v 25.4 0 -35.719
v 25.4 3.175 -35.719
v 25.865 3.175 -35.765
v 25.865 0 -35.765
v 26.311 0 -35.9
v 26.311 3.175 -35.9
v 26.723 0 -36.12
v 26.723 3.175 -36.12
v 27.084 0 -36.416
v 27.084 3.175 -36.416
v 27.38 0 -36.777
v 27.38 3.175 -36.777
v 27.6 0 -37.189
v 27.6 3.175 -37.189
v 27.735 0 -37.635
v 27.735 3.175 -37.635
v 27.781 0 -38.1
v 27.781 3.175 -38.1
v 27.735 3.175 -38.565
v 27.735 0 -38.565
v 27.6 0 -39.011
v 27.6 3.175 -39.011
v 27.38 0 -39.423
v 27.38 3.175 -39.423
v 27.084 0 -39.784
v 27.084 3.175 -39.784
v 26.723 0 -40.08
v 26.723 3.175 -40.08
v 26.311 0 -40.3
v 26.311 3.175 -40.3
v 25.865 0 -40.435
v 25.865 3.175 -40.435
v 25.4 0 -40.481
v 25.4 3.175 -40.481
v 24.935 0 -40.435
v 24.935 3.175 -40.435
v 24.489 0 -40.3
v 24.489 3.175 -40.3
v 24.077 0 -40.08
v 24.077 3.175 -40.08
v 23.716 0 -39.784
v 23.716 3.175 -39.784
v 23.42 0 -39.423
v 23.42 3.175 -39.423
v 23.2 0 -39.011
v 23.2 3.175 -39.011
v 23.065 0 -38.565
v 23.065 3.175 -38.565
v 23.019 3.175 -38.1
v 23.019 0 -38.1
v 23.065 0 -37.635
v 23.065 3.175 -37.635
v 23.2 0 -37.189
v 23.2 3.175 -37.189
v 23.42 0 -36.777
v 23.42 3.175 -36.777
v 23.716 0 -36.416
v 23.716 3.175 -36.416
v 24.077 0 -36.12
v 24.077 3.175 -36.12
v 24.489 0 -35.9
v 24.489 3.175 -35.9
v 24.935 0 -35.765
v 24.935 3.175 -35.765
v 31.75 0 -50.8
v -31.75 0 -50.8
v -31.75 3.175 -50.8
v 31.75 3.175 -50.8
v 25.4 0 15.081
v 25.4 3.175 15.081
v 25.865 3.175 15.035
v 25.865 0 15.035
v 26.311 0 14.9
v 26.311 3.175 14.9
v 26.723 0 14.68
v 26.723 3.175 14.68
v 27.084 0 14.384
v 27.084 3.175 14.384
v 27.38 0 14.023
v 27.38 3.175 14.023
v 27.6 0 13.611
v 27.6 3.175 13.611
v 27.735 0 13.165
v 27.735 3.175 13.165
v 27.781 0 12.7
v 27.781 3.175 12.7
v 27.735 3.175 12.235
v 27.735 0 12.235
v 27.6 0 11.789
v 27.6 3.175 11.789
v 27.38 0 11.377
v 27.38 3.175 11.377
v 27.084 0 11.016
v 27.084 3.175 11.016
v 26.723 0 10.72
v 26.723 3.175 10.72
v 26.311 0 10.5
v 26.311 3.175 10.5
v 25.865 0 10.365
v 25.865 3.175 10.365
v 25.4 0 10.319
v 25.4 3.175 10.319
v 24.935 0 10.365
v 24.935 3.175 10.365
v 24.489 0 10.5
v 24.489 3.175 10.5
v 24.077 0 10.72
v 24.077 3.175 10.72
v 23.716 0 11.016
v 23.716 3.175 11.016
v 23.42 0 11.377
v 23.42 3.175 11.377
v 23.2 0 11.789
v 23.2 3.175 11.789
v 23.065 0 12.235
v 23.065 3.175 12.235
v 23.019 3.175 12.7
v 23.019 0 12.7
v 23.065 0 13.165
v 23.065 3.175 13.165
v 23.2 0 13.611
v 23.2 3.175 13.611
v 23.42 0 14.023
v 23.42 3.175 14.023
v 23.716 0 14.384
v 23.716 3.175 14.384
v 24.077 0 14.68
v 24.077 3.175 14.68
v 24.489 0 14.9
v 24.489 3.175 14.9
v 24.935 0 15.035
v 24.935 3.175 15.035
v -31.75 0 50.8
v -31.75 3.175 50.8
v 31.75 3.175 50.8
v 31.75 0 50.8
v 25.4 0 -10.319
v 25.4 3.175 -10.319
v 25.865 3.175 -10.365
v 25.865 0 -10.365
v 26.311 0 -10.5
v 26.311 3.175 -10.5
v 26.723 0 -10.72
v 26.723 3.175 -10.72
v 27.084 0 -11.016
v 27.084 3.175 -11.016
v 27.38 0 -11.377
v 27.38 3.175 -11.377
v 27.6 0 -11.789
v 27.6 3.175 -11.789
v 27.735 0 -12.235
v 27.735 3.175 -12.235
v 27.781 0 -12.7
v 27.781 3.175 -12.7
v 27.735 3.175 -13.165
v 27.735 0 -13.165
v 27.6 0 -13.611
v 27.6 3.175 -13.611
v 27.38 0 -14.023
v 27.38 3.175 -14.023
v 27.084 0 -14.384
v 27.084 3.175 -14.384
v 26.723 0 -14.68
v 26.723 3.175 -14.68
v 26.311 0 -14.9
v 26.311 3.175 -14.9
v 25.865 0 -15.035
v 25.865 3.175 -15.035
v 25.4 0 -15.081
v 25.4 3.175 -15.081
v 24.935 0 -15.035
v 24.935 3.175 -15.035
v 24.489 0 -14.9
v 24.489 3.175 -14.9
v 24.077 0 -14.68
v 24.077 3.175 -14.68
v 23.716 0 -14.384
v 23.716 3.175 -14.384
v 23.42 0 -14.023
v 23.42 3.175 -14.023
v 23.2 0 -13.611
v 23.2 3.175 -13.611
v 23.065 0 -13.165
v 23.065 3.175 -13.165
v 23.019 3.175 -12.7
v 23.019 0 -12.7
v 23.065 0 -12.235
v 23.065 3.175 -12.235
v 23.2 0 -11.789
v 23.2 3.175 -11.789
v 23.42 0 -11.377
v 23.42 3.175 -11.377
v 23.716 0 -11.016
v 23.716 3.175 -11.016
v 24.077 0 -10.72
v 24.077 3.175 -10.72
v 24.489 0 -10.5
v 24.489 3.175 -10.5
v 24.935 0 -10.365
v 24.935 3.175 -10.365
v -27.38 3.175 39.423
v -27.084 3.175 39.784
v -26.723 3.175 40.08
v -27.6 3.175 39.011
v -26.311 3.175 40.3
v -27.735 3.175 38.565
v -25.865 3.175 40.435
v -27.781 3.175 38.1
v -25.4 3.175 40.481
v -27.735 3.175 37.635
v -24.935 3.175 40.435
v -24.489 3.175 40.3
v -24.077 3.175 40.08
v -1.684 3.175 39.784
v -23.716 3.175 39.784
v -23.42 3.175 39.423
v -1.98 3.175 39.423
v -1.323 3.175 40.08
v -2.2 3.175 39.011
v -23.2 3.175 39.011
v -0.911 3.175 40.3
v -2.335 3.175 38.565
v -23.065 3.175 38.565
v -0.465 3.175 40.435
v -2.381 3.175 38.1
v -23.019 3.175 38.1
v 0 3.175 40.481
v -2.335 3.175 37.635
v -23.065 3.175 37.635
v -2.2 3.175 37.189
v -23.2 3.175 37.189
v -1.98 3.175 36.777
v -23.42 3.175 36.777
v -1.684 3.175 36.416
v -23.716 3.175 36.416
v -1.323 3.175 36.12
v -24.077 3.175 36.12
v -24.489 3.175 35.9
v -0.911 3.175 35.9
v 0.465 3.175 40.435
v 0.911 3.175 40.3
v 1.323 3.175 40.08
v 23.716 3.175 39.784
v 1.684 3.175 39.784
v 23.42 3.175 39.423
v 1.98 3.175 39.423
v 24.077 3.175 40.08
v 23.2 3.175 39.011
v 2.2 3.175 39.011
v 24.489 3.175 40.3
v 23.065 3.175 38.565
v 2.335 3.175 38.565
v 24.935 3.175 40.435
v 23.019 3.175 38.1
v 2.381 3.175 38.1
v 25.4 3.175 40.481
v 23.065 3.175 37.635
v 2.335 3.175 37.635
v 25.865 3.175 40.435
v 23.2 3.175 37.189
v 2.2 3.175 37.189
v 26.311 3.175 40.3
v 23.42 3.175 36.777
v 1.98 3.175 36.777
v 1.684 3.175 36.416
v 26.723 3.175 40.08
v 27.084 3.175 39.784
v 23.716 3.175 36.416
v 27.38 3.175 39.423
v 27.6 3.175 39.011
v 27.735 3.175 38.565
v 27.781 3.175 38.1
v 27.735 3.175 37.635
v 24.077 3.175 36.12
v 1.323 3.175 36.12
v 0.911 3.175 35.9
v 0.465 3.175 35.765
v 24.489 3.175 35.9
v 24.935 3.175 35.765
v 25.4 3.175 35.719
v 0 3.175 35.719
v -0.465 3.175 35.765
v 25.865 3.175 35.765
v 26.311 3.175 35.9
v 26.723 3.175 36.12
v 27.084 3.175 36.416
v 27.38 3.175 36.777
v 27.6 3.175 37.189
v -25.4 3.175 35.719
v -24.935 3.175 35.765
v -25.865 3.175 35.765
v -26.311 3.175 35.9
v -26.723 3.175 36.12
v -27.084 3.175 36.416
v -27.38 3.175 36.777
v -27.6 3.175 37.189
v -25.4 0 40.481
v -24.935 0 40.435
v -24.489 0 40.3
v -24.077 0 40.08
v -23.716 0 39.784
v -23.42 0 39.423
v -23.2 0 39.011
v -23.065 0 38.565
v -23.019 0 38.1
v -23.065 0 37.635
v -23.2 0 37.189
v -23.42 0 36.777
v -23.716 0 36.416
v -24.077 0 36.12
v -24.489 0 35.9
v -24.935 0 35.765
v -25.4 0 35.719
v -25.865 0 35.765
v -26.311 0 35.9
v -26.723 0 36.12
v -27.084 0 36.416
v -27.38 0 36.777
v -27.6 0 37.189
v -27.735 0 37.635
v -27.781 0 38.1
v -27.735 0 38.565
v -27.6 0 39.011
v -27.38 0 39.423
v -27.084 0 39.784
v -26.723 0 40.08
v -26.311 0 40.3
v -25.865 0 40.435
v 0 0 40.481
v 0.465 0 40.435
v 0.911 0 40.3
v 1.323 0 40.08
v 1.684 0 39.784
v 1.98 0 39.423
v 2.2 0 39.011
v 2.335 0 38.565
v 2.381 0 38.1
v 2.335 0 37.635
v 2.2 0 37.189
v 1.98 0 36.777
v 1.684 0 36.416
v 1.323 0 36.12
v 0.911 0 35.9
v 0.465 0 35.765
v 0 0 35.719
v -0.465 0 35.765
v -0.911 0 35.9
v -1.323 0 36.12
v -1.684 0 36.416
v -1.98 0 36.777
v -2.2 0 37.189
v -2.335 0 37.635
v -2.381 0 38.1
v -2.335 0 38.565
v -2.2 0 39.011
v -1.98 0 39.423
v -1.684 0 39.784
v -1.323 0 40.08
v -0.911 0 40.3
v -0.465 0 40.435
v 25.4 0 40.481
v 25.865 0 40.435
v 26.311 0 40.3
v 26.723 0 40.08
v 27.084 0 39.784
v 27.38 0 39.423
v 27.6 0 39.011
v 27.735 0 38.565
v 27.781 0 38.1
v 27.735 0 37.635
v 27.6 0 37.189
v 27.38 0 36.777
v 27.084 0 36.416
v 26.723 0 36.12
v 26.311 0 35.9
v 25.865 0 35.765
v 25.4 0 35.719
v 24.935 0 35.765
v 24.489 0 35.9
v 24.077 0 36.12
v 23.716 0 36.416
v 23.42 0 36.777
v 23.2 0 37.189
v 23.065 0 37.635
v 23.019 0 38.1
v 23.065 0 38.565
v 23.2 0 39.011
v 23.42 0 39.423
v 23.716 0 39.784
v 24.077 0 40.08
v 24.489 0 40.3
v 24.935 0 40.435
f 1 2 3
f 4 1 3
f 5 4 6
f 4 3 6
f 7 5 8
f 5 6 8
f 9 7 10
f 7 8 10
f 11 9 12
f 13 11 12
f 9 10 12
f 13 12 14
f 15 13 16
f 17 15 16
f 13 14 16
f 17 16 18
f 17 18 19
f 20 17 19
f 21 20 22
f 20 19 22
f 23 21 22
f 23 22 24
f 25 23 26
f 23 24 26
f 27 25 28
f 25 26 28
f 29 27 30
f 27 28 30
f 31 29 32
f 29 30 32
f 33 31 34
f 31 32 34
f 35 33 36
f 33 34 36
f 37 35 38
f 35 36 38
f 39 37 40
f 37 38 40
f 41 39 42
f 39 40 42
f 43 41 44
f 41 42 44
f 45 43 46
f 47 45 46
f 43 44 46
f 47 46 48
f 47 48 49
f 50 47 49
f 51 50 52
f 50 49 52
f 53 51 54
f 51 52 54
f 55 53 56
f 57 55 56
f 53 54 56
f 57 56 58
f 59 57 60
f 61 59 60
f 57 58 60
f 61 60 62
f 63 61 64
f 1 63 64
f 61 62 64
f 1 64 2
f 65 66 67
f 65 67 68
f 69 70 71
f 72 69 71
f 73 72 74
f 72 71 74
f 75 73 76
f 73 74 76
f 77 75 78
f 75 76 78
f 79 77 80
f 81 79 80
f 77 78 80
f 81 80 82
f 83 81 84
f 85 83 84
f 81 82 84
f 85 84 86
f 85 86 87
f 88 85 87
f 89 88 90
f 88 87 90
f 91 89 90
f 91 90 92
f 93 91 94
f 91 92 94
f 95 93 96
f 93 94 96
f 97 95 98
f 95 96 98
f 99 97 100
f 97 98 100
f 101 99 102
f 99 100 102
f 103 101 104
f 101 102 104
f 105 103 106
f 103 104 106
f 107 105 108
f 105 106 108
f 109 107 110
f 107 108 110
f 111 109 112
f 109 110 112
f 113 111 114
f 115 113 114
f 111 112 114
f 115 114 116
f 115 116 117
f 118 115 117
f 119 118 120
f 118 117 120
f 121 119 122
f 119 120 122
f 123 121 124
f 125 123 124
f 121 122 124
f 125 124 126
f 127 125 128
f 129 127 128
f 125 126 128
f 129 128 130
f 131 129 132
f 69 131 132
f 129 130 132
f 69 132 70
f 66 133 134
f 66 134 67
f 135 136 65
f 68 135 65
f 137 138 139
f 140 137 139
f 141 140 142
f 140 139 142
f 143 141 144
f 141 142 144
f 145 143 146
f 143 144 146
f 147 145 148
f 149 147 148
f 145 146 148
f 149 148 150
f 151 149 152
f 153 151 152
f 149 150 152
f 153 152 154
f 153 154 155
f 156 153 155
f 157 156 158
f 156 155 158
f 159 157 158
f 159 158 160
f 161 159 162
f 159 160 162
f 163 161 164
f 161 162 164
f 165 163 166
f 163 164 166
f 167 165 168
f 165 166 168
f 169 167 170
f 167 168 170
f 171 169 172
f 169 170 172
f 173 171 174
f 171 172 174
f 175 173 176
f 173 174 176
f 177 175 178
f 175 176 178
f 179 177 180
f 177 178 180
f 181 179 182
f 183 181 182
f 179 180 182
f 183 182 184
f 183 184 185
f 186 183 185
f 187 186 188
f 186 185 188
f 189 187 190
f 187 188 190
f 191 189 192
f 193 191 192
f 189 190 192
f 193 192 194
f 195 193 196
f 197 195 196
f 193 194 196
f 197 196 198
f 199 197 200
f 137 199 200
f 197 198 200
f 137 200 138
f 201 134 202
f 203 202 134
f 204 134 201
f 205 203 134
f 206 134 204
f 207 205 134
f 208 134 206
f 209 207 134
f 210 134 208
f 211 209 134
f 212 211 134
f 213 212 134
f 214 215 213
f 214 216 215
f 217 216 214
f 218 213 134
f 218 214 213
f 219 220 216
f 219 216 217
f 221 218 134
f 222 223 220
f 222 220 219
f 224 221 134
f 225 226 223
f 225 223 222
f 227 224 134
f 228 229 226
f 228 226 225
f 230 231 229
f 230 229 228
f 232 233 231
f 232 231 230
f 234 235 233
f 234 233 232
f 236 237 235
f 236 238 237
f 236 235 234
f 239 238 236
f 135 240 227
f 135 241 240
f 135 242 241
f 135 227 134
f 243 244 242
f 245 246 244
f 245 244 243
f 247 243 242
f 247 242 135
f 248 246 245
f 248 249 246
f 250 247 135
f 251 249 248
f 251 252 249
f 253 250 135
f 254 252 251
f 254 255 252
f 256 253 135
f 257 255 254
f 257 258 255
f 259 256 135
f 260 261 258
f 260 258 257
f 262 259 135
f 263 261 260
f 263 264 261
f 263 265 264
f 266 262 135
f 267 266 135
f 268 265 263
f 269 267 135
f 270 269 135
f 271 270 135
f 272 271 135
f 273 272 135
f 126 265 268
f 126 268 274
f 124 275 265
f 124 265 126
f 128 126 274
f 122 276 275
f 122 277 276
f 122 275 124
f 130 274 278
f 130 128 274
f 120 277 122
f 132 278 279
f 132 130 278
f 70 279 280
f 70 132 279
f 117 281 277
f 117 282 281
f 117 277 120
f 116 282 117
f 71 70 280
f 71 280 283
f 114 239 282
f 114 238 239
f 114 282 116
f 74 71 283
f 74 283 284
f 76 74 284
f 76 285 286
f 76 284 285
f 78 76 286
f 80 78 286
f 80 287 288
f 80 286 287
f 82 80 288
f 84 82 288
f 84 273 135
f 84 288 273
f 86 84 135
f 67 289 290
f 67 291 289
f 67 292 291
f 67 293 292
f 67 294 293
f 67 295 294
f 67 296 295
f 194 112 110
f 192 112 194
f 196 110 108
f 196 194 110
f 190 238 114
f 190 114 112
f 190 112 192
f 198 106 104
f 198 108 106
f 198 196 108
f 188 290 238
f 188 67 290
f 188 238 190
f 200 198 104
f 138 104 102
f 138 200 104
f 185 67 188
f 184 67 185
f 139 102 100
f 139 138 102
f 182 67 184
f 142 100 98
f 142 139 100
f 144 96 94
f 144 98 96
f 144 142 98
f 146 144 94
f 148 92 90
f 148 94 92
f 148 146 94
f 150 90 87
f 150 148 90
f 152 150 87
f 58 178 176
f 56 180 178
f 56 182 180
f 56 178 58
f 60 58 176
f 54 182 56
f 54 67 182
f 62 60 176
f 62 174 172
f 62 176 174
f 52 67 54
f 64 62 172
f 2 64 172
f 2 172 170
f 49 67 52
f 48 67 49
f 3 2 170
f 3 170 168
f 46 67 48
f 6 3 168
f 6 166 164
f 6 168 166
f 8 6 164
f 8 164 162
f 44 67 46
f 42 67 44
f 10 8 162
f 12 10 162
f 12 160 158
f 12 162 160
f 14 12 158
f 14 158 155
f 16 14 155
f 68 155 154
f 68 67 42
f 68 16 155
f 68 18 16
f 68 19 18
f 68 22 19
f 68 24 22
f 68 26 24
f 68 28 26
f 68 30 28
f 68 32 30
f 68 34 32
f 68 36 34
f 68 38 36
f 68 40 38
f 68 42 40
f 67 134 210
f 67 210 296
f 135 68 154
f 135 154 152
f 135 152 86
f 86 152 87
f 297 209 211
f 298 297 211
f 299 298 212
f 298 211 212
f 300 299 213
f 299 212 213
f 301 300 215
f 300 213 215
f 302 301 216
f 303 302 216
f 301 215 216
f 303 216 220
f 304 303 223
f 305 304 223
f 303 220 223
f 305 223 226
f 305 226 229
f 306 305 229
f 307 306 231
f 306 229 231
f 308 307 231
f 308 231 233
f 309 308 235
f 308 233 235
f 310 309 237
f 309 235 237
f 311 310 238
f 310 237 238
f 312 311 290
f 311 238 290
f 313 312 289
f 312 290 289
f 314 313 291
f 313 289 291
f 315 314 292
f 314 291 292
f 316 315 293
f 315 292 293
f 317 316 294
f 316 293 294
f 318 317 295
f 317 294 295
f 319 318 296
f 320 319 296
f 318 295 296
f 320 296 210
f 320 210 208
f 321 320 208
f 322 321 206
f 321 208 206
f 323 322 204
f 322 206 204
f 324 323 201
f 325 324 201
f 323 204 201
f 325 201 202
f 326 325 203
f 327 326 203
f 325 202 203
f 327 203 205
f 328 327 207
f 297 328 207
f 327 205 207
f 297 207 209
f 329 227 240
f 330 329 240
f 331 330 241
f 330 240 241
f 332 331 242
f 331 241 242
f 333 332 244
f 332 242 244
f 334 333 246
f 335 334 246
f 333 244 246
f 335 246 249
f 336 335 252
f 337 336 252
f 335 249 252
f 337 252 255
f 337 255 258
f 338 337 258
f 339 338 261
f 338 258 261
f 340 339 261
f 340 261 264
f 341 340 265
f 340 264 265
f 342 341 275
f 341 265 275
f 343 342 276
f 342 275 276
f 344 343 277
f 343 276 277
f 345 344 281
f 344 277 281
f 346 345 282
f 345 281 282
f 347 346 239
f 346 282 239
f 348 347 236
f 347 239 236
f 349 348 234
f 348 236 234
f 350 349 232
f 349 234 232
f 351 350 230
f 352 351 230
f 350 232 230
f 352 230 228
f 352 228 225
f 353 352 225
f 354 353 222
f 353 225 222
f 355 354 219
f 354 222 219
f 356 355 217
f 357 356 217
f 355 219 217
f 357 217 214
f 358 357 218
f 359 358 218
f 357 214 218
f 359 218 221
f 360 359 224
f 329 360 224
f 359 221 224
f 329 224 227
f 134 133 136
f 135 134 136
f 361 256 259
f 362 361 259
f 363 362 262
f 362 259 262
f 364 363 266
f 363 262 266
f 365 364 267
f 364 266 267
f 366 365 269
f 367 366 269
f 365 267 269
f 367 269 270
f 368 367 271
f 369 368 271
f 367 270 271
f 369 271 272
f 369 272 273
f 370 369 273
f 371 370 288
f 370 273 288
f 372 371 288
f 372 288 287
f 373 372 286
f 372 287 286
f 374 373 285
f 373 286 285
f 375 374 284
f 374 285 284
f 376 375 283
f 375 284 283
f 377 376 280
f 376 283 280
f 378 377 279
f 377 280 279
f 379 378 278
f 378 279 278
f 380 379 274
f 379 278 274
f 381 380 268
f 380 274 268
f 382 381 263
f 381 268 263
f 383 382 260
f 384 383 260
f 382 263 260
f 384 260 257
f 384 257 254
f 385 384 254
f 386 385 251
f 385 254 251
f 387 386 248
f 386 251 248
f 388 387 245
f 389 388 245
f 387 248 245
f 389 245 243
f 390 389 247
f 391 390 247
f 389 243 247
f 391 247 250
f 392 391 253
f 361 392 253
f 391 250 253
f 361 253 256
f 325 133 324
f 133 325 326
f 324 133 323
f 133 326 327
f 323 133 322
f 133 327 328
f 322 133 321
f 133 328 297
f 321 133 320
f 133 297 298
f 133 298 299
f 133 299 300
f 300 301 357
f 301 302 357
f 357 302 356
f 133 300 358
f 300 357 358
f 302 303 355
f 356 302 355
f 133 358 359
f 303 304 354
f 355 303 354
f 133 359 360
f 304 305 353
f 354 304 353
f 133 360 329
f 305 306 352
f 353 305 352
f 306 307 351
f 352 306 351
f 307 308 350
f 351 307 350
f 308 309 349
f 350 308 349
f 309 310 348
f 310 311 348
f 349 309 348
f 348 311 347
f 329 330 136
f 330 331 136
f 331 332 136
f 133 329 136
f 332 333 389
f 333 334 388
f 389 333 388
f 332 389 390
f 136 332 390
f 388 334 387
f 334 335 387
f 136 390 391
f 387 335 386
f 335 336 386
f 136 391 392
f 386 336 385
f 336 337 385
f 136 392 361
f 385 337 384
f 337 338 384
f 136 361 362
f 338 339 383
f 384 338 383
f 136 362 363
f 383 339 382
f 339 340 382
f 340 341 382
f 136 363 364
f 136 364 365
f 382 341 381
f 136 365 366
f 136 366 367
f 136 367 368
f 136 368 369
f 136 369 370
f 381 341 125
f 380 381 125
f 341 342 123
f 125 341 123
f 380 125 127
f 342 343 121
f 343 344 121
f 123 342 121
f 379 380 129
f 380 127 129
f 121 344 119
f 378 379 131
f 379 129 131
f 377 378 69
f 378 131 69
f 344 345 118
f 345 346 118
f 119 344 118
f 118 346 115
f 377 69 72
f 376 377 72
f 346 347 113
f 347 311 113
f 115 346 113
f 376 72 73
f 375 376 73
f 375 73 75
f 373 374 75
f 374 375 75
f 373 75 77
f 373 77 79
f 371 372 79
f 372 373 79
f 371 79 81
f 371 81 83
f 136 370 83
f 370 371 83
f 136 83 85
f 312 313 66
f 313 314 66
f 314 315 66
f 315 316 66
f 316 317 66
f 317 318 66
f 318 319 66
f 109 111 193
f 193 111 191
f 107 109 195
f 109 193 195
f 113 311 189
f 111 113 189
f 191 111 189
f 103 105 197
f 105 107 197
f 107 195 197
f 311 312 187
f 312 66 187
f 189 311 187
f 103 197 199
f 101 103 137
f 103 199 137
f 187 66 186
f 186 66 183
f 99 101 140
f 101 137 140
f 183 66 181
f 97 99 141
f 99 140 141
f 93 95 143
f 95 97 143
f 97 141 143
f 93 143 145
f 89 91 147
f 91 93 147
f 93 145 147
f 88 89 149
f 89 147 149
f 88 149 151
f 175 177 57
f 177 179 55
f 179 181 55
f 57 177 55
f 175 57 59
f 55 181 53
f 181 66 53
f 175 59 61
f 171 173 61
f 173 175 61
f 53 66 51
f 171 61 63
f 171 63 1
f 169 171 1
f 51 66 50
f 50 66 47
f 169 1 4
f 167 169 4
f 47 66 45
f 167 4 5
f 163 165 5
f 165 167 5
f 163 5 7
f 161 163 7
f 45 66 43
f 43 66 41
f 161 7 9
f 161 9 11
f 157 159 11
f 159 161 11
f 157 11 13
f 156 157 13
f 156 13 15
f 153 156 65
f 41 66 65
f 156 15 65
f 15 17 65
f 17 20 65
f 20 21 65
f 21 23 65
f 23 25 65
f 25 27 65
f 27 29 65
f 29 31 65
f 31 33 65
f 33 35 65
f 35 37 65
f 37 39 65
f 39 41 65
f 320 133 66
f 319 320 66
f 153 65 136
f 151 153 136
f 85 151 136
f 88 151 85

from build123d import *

# Parameters (mm, degrees)
SKETCH1_W           = 63.5
SKETCH1_H           = 101.6
BOSS_EXTRUDE1_DEPTH = 3.175
SKETCH2_R           = 2.38125
CUT_EXTRUDE1_DEPTH  = 3.175


with BuildPart() as part:
    # Sketch1 → Boss-Extrude1 (new body)
    with BuildSketch(Plane(origin=(0, 0, 0), x_dir=(1, 0, 0), z_dir=(0, 1, 0))):
        Rectangle(SKETCH1_W, SKETCH1_H)
    extrude(amount=BOSS_EXTRUDE1_DEPTH)

    # Sketch2 → Cut-Extrude1 (cut)
    with BuildSketch(Plane(origin=(0, 3.175, 0), x_dir=(1, 0, 0), z_dir=(0, 1, 0))):
        with Locations(Location((25.4, -38.1, 0), (0, 0, 270))):
            Circle(SKETCH2_R)
        with Locations(Location((25.4, -12.7, 0), (0, 0, 270))):
            Circle(SKETCH2_R)
        with Locations(Location((25.4, 12.7, 0), (0, 0, 270))):
            Circle(SKETCH2_R)
        with Locations(Location((25.4, 38.1, 0), (0, 0, 270))):
            Circle(SKETCH2_R)
        with Locations(Location((0, -38.1, 0), (0, 0, 270))):
            Circle(SKETCH2_R)
        with Locations(Location((-25.4, -38.1, 0), (0, 0, 270))):
            Circle(SKETCH2_R)
        with Locations((-50.8, -38.1)):
            Circle(SKETCH2_R)
    extrude(amount=-CUT_EXTRUDE1_DEPTH, mode=Mode.SUBTRACT)


solid = part.part
